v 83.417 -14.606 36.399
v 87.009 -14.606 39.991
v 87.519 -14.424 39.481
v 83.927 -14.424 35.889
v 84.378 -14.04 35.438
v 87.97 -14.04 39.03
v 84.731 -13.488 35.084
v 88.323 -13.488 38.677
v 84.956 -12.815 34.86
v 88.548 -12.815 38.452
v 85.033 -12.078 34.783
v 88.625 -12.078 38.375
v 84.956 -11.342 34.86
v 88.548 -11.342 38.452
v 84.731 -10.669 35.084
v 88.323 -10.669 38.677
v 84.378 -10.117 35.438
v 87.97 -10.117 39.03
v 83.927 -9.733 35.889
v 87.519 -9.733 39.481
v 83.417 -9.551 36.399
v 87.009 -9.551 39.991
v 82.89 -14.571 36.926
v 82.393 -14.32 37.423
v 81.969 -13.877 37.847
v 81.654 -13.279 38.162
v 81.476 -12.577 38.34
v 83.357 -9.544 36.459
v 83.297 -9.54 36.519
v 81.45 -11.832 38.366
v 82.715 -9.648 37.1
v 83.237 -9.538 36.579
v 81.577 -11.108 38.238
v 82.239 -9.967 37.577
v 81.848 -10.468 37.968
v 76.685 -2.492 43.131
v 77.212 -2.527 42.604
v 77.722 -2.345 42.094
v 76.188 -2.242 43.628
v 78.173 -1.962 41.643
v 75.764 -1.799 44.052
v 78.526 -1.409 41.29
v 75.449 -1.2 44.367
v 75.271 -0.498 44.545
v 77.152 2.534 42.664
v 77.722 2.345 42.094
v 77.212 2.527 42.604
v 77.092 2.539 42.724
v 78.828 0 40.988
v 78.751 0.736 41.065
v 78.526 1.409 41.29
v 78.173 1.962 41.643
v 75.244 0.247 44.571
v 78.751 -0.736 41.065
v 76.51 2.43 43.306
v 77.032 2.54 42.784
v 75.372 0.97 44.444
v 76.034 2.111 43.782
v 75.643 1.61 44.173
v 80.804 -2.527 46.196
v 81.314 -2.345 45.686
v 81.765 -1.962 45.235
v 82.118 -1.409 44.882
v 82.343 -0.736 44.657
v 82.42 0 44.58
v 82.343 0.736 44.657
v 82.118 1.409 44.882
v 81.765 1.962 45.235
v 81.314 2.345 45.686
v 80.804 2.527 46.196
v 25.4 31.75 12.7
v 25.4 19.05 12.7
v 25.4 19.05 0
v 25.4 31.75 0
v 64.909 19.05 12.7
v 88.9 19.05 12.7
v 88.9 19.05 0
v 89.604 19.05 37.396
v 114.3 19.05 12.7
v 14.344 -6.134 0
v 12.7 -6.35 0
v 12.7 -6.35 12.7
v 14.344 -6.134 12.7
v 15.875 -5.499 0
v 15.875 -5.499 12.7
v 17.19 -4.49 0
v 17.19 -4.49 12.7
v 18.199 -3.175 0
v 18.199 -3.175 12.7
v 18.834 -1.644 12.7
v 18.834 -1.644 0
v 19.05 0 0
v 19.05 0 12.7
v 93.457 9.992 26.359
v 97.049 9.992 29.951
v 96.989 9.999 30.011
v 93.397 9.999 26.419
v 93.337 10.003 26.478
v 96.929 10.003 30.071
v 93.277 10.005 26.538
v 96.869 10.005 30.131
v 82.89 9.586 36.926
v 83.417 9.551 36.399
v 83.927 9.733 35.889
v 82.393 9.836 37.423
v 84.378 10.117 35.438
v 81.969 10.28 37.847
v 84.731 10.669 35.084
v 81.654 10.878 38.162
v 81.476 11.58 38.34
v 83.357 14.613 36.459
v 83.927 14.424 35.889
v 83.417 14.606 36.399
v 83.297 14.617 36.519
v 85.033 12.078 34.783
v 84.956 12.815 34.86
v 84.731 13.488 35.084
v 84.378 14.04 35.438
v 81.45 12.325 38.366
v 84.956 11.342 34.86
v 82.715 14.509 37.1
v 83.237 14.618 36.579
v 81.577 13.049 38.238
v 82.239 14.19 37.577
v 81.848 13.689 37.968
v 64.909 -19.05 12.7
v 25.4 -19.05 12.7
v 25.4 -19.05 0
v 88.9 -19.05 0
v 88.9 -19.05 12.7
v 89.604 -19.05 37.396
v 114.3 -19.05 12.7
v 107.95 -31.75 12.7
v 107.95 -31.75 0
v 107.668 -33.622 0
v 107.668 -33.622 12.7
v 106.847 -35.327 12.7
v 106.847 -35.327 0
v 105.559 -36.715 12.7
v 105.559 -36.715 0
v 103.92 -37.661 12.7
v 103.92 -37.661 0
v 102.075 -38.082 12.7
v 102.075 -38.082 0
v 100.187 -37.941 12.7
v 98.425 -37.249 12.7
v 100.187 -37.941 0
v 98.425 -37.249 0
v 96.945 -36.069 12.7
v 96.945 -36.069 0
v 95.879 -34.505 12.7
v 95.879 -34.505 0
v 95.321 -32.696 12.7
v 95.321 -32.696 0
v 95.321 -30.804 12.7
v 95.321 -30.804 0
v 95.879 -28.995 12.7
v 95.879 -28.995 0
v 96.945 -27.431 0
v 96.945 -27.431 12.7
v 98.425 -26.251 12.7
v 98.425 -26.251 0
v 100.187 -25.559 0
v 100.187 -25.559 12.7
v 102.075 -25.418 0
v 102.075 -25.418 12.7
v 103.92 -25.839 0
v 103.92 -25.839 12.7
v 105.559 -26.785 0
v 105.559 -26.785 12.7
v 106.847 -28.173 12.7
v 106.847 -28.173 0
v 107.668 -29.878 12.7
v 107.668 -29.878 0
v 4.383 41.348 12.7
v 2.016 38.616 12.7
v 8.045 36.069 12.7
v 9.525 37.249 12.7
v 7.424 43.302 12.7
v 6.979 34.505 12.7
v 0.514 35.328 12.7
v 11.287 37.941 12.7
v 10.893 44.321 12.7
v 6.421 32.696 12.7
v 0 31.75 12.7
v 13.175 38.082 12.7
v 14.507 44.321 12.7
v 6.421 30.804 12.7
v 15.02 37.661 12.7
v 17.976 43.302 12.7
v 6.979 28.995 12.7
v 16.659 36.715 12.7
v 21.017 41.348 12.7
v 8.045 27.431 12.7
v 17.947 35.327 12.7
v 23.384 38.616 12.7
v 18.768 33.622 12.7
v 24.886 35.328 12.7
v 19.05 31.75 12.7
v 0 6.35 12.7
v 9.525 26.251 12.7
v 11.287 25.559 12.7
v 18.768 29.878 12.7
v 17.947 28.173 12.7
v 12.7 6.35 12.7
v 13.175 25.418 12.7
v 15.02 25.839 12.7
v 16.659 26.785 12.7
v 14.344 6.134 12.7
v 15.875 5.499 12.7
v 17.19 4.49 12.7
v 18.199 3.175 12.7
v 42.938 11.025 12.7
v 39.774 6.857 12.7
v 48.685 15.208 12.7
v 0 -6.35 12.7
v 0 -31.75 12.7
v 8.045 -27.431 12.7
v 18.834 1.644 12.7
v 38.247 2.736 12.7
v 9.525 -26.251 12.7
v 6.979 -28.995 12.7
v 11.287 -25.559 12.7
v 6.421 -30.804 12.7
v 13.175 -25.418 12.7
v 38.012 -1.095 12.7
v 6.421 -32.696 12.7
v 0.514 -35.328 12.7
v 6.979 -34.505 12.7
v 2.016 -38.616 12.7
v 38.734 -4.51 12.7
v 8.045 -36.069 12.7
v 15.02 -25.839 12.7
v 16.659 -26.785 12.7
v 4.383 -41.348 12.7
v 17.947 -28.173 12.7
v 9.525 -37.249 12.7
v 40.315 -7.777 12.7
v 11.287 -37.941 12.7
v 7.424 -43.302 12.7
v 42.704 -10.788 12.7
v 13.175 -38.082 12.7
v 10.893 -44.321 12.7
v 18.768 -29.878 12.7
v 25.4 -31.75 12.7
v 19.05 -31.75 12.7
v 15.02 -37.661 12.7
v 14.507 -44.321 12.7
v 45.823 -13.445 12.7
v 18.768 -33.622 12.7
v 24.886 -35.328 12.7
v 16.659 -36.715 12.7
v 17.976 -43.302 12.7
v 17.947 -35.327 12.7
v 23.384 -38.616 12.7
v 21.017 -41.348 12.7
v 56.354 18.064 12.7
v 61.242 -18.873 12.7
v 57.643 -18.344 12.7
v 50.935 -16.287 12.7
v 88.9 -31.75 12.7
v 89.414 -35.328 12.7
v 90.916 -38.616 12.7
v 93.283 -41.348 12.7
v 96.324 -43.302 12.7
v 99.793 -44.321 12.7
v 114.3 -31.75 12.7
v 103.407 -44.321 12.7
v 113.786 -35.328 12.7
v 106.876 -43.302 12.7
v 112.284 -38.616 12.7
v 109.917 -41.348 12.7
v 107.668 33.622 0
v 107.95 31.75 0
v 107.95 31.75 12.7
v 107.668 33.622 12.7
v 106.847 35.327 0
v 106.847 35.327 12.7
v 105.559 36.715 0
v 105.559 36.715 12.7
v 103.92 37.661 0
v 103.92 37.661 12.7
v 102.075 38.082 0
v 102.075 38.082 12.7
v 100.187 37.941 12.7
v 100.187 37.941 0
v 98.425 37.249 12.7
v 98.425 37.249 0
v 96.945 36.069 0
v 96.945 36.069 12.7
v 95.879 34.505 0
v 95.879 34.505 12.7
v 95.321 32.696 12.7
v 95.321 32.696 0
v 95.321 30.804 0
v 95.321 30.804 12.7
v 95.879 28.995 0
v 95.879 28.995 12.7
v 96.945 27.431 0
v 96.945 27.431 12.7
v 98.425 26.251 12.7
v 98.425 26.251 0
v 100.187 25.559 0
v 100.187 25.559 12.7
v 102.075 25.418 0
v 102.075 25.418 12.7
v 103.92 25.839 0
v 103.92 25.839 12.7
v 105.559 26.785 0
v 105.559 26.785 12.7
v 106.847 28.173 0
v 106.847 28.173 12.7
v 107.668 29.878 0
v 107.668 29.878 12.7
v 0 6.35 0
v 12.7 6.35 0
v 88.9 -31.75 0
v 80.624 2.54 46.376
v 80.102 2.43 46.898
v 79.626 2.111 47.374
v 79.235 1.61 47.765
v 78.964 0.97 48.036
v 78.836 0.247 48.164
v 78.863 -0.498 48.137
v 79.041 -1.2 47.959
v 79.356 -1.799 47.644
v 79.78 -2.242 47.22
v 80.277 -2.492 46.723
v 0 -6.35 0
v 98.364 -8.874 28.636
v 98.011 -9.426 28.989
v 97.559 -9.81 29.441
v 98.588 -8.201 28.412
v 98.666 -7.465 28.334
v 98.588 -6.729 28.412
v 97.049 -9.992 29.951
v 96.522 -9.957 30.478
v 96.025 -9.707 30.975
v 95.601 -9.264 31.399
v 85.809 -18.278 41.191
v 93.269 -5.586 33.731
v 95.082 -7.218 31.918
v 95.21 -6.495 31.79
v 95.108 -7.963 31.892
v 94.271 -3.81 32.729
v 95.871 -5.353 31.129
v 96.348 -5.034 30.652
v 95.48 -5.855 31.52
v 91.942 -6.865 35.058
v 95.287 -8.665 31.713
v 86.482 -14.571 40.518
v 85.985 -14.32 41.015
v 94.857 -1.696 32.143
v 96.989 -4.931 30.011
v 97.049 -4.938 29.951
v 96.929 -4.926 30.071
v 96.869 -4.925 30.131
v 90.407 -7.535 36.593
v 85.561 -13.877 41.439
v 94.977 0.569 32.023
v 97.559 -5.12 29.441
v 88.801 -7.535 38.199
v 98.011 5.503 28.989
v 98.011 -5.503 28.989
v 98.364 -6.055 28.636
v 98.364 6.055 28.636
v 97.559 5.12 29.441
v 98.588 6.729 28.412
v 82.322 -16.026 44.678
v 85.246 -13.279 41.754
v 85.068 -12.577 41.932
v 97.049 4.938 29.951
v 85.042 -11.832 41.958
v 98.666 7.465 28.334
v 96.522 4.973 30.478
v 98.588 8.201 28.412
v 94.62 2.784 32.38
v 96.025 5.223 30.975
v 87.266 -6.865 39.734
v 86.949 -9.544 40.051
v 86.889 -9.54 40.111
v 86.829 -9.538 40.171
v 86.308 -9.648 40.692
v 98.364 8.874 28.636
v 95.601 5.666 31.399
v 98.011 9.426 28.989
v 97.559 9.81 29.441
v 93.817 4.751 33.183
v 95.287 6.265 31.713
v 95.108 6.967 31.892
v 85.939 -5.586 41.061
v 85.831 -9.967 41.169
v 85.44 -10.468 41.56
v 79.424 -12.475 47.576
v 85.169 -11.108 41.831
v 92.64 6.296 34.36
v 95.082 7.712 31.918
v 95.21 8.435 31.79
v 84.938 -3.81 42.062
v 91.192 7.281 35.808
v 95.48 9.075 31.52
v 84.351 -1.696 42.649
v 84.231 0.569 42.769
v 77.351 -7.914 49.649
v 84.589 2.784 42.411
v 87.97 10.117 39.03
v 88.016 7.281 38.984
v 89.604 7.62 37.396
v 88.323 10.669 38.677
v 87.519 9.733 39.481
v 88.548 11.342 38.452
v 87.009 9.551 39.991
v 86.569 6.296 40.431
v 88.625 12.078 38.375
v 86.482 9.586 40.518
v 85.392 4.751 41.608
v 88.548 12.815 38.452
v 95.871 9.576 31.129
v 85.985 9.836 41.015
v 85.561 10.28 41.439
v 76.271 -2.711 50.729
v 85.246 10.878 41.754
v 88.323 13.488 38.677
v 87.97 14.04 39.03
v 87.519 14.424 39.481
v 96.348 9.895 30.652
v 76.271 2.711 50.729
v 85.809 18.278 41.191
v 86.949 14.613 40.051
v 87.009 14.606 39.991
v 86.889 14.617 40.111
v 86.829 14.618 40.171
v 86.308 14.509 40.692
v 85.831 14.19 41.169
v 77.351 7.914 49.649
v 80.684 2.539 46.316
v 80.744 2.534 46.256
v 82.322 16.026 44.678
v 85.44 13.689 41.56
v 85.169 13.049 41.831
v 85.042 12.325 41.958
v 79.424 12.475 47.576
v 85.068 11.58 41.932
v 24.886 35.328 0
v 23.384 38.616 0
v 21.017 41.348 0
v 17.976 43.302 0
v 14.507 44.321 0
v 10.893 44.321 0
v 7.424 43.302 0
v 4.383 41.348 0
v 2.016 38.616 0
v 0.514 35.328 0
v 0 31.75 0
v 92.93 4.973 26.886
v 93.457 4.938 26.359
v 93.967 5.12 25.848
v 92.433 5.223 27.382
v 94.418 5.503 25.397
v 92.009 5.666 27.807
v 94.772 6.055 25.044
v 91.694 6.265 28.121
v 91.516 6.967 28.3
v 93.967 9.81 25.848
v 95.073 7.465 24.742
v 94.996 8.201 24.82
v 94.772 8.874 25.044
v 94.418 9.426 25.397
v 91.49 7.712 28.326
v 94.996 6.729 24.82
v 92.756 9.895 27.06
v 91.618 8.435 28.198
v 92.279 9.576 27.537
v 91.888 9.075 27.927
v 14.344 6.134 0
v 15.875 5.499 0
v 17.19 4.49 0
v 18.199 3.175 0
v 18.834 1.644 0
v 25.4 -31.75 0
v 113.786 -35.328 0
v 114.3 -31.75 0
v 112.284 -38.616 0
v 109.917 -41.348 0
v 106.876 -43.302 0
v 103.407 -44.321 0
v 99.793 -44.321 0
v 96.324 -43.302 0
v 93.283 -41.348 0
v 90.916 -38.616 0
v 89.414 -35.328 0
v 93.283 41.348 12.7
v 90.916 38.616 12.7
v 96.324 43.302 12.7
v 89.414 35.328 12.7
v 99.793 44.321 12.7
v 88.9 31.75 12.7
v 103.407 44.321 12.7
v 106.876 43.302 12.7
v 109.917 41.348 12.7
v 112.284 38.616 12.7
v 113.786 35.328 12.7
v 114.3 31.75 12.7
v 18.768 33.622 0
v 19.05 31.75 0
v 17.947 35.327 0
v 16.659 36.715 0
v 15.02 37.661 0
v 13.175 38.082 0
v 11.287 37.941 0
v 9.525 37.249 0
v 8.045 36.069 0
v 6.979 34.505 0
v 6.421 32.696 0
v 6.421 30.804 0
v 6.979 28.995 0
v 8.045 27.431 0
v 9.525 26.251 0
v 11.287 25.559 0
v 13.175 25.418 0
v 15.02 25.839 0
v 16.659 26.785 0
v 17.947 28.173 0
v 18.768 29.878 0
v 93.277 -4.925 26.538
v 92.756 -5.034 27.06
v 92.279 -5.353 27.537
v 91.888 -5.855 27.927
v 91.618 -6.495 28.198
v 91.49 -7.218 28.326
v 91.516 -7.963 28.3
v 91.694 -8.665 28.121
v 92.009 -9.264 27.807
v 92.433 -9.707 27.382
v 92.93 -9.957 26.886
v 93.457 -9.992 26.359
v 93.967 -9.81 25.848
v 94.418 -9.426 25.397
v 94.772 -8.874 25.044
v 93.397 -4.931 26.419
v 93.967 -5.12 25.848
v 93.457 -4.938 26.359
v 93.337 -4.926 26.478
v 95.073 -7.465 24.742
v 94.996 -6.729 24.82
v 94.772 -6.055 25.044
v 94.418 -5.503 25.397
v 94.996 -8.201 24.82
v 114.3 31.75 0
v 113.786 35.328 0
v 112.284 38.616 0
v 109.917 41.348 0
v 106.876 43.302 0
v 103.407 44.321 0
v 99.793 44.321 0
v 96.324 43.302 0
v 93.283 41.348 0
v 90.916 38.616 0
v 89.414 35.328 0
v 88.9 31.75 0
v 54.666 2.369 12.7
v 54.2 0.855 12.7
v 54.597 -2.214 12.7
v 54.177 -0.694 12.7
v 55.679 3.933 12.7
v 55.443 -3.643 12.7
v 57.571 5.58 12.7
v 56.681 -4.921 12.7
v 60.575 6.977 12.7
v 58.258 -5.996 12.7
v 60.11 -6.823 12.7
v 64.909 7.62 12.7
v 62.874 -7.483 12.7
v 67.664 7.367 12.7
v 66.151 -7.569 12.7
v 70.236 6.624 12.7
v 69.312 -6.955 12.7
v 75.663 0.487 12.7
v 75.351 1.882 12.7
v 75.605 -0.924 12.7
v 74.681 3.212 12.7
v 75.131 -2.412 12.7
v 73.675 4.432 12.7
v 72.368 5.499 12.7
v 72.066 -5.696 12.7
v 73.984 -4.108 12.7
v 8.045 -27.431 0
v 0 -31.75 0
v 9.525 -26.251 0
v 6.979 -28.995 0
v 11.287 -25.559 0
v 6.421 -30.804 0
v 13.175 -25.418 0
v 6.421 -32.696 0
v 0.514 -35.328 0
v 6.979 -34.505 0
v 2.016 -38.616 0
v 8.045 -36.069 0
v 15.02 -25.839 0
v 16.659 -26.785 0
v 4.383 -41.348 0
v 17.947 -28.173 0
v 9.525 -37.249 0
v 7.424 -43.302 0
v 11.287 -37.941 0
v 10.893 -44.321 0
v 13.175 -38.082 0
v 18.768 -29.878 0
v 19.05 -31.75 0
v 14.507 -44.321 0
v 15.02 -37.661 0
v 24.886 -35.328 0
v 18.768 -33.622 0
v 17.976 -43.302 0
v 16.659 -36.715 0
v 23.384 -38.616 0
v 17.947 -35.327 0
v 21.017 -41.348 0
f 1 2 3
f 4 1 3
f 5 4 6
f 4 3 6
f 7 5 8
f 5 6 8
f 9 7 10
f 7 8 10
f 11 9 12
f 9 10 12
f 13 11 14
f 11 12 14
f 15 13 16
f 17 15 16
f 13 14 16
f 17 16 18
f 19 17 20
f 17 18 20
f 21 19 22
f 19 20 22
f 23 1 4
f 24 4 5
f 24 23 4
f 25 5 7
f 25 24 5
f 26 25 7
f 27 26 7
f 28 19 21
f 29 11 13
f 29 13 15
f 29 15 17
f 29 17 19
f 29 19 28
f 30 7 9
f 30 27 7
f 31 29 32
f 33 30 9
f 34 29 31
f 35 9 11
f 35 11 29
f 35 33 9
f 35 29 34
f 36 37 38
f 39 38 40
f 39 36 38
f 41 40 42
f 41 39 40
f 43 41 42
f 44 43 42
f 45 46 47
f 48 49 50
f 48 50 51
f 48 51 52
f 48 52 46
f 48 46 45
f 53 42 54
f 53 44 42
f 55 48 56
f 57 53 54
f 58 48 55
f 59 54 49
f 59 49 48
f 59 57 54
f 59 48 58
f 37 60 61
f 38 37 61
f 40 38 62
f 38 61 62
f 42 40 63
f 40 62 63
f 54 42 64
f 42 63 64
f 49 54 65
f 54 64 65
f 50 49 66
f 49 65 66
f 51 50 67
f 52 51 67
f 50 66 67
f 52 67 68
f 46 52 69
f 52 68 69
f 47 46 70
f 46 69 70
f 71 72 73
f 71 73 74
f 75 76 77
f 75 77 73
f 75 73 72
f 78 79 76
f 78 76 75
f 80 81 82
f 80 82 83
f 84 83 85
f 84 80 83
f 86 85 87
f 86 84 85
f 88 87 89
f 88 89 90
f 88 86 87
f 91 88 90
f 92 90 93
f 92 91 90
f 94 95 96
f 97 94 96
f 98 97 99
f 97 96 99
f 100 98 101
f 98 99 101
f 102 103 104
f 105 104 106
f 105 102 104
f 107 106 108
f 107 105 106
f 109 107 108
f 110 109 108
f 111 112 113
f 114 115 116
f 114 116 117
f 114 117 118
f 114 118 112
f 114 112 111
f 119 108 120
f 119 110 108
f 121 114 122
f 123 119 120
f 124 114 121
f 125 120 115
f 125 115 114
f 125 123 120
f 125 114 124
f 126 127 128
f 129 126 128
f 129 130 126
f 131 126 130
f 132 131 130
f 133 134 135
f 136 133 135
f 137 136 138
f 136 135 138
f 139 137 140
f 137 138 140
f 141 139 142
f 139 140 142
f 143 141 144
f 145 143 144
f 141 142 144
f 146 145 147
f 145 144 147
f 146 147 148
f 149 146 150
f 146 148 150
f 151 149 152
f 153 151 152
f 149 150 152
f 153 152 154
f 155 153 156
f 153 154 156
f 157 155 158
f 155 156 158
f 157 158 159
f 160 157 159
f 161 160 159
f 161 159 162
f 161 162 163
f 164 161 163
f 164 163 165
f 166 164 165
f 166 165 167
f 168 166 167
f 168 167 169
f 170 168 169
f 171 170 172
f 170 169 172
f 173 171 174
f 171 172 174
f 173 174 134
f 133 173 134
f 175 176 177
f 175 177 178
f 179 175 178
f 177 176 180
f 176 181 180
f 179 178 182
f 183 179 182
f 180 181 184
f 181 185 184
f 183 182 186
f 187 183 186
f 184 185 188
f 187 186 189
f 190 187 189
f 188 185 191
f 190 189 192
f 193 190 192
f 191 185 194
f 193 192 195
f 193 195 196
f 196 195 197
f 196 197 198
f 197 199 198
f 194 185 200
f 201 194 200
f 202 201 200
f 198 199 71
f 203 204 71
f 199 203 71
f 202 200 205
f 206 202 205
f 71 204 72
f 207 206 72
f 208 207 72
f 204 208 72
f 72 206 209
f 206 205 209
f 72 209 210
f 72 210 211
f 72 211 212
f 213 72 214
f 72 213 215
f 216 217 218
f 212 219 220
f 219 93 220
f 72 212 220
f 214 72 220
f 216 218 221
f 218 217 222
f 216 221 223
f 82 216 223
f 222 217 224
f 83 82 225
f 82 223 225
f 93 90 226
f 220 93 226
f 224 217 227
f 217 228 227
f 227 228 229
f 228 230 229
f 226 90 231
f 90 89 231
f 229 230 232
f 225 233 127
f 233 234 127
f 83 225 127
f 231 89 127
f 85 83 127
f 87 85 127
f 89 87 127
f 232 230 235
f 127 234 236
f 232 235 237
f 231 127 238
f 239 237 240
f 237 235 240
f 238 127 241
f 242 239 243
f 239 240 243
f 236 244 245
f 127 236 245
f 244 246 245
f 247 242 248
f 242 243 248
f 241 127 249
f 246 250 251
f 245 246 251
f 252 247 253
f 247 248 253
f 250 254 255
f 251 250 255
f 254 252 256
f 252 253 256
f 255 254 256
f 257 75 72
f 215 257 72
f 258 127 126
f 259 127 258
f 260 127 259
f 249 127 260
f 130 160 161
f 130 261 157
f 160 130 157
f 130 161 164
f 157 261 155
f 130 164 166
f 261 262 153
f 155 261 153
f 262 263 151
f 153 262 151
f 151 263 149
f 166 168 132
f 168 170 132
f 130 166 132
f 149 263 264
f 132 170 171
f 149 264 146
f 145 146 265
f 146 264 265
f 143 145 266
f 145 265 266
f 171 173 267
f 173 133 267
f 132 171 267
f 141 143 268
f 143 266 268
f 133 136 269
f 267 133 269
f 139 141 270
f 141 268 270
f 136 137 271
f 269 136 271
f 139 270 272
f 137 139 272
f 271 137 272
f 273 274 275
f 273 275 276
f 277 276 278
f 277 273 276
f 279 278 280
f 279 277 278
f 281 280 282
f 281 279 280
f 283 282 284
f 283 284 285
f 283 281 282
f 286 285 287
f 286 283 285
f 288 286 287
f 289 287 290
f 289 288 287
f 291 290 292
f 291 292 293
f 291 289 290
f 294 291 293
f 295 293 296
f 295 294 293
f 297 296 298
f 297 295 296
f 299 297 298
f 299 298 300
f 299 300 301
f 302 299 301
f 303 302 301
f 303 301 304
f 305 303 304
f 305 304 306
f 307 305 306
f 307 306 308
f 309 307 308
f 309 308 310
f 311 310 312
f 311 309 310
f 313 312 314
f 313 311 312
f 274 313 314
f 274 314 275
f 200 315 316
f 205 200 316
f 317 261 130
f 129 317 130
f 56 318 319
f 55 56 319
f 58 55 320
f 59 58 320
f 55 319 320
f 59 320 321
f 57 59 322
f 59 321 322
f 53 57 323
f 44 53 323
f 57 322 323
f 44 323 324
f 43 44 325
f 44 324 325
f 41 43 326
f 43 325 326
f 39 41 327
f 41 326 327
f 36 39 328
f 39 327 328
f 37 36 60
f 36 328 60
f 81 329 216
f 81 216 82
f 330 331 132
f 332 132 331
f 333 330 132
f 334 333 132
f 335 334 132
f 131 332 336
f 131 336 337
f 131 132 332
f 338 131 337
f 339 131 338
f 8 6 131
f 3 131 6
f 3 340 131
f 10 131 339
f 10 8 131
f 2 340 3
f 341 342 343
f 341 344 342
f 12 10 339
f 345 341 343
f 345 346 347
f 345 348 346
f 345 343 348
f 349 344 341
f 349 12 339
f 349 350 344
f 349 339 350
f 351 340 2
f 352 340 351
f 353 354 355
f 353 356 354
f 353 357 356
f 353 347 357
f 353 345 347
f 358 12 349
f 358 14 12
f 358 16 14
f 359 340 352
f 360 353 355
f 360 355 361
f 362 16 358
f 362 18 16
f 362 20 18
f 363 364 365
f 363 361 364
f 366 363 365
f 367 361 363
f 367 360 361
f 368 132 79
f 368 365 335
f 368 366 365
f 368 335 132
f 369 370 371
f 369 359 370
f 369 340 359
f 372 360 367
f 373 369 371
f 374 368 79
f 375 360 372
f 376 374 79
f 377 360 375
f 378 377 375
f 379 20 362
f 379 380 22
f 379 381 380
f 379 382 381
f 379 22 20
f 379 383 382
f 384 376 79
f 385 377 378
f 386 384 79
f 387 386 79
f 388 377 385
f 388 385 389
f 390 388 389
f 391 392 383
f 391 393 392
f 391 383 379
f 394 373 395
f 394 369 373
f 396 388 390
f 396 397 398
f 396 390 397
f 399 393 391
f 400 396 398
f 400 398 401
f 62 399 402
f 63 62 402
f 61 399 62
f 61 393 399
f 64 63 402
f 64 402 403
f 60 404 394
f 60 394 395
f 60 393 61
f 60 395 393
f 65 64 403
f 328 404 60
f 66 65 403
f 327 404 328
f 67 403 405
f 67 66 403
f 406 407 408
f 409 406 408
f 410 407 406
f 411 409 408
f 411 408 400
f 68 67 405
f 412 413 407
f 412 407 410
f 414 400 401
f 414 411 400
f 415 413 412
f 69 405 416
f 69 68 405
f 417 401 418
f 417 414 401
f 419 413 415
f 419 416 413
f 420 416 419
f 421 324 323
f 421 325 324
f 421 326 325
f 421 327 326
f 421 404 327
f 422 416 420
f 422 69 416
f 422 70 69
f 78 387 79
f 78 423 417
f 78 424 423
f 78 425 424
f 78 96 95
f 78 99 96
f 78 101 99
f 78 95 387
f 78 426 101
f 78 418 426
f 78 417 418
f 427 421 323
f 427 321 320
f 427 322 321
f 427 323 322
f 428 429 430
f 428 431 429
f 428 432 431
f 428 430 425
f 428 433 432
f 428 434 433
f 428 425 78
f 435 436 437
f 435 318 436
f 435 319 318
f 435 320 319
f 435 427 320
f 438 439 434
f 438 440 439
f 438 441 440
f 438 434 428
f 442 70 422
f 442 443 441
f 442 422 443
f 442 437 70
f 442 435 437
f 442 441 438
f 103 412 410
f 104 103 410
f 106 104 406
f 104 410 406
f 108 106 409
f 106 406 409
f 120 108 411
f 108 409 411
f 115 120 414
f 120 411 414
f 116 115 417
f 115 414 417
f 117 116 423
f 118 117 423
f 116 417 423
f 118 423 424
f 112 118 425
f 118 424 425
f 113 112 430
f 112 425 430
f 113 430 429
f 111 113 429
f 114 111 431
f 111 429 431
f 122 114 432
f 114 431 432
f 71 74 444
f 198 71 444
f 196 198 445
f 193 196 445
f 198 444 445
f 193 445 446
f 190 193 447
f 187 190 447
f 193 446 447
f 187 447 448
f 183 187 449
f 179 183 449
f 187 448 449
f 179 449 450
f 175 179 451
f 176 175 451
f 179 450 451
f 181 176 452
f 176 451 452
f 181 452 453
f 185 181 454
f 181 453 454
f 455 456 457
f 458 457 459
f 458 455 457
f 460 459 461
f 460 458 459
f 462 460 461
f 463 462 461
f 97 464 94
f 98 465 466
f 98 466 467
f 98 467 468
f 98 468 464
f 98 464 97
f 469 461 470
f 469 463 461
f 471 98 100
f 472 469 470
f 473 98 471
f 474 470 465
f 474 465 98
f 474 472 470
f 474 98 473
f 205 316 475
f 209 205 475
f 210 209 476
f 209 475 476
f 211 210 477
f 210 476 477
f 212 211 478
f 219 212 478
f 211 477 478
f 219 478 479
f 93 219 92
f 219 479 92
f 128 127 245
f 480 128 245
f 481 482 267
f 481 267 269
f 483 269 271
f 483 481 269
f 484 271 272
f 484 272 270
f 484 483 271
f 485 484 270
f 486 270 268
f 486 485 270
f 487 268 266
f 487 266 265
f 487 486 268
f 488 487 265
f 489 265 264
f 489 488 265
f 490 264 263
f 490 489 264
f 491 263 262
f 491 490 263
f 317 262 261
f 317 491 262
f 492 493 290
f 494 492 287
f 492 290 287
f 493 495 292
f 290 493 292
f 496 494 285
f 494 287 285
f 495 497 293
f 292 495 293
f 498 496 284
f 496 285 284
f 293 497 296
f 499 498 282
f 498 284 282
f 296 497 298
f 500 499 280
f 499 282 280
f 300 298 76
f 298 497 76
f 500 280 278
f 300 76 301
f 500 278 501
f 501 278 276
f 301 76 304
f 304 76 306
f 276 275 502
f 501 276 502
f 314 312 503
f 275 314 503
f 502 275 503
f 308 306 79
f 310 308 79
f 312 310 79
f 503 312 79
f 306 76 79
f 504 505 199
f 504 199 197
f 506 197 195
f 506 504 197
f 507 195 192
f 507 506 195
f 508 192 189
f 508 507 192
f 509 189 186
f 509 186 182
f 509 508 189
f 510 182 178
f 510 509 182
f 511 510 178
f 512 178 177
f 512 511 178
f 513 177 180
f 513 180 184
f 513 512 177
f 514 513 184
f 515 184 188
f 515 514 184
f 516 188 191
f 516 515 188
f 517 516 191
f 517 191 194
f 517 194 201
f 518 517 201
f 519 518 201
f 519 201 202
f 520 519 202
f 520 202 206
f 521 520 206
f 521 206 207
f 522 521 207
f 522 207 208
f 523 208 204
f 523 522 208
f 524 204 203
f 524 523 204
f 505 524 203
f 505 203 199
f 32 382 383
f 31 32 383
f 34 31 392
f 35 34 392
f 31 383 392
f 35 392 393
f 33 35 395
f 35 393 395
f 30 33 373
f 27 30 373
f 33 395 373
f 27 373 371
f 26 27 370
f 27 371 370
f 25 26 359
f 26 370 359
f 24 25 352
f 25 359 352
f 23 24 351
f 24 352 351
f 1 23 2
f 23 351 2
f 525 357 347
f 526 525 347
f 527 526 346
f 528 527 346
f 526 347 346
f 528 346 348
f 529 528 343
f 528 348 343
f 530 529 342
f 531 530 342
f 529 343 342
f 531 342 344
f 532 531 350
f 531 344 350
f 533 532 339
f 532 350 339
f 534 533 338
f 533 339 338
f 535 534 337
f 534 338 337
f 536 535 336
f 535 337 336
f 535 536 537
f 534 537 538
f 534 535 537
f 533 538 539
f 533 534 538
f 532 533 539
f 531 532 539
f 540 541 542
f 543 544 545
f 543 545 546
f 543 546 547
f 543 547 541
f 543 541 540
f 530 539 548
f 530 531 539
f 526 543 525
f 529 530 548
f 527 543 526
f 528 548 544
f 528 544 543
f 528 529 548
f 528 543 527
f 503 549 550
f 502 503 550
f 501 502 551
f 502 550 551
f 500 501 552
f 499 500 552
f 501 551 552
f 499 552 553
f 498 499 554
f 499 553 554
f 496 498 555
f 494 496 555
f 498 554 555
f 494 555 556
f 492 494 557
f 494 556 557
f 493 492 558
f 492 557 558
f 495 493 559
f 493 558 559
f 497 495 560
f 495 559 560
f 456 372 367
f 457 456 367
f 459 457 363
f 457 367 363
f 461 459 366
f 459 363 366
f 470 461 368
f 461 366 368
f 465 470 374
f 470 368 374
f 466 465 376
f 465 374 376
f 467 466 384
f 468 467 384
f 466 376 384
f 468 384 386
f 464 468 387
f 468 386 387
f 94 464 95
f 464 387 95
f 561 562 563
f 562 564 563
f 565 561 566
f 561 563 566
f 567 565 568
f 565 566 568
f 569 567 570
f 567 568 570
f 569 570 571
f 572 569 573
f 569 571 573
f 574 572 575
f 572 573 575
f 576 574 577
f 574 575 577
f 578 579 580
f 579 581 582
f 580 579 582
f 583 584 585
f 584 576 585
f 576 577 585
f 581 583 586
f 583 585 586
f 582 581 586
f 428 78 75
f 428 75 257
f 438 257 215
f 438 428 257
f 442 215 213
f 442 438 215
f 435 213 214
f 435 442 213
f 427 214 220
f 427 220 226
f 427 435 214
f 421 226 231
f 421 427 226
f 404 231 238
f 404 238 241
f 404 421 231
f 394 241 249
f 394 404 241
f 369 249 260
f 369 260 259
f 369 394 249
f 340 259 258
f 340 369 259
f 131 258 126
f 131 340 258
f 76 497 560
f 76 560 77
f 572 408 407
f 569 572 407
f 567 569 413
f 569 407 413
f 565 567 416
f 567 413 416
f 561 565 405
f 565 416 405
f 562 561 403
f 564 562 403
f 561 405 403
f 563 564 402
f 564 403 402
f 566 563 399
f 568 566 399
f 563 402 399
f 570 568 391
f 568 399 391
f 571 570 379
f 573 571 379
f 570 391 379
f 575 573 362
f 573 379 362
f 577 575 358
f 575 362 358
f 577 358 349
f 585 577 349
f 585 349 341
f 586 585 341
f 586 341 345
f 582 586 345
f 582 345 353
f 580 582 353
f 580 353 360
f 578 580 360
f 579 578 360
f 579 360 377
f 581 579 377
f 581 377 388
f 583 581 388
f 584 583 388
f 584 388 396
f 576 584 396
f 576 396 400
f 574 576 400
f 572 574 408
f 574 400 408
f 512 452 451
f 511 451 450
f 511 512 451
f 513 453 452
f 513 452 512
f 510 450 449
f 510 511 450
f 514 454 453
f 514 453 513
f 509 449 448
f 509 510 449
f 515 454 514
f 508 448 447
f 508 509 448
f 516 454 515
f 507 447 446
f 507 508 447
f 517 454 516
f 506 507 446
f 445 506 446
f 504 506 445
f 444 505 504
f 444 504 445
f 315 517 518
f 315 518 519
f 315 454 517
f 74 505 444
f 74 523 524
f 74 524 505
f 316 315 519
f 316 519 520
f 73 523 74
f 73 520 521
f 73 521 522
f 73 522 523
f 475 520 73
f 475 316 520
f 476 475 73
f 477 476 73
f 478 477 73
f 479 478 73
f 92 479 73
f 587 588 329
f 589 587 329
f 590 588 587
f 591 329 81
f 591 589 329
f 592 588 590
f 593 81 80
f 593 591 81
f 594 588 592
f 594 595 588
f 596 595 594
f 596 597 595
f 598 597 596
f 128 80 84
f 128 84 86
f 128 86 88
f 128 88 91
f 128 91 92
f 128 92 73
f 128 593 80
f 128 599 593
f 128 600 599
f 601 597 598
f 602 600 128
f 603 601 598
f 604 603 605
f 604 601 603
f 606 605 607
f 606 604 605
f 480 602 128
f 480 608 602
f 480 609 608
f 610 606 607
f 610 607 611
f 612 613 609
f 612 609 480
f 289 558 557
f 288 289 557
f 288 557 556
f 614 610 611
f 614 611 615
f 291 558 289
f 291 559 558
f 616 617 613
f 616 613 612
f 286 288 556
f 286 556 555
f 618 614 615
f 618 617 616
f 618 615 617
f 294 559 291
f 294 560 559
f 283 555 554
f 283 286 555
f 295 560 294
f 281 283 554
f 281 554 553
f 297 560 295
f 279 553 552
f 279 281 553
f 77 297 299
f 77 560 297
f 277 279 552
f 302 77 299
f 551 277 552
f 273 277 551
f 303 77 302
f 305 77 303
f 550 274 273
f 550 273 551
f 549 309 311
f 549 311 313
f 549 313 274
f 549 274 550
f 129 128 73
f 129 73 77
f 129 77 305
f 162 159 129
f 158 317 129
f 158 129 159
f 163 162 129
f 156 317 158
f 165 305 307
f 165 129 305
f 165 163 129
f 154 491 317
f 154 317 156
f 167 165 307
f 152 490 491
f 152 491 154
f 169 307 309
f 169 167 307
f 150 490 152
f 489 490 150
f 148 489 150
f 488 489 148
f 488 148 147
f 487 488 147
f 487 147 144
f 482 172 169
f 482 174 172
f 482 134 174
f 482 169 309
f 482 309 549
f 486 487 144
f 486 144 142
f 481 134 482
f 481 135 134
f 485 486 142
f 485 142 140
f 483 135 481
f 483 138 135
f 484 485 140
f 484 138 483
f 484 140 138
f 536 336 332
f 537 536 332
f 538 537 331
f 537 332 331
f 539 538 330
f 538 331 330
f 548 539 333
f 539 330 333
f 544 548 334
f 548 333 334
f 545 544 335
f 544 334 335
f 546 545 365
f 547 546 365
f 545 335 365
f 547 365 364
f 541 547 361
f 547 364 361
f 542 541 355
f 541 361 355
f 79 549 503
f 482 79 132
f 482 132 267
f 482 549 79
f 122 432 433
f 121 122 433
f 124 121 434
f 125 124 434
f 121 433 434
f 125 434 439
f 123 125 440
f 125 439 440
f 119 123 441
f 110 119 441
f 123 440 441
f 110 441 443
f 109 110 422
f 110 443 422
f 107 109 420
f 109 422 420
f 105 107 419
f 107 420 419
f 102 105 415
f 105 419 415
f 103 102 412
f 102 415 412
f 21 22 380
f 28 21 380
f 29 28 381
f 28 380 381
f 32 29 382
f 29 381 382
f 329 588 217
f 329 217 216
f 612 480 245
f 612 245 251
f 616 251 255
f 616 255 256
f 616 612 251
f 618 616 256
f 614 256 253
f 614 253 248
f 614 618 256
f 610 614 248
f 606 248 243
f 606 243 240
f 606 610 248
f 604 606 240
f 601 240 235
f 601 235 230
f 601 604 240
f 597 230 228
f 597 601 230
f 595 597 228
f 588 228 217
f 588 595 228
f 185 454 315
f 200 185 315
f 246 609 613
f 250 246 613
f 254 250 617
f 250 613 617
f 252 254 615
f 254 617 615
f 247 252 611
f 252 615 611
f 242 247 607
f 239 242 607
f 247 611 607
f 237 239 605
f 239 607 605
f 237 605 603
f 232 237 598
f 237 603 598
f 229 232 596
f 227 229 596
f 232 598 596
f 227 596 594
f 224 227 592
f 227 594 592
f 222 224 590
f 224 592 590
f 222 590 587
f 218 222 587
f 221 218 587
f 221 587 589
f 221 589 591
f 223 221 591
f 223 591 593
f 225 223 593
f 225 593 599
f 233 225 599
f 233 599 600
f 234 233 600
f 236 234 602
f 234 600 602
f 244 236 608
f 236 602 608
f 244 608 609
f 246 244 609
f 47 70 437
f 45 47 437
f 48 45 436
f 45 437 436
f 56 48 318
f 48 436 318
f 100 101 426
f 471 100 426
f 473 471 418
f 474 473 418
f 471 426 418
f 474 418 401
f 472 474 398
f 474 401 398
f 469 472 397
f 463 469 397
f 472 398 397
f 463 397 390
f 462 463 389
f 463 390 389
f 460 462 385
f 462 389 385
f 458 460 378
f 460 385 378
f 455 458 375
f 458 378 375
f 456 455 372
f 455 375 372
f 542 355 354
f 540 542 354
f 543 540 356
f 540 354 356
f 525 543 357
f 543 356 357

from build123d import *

# Parameters (mm, degrees)
F0_R             = 6.35
F1_DEPTH         = 12.7
F4_R             = 7.62
F6_DEPTH         = 5.08
F6_COPIES_COUNT  = 2
F6_COPIES_PITCH  = 14.929745
F6_COPIES1_COUNT = 2
F6_COPIES1_PITCH = 14.929745
F6_COPIES2_COUNT = 2
F6_COPIES2_PITCH = 24.156836
F6_COPIES3_COUNT = 2
F6_COPIES3_PITCH = 24.156836


# Not quite as in the source:
# - a pattern or mirror of a feature is missing from the dataset's text; its kind, count and spacing are read off the source's solid


with BuildPart() as f1:
    # F0 (on Top) → F1 (new body)
    with BuildSketch(Plane.XY):
        with BuildLine():
            Line((0, 31.75), (0, 6.35))
            Line((0, 6.35), (12.7, 6.35))
            ThreePointArc((12.7, 6.35), (17.1901280605, 4.4901280605), (19.05, 0))
            Line((19.05, 0), (114.3, 0))
            Line((114.3, 0), (114.3, 31.75))
            ThreePointArc((114.3, 31.75), (101.6, 44.45), (88.9, 31.75))
            Line((88.9, 31.75), (88.9, 19.05))
            Line((88.9, 19.05), (25.4, 19.05))
            Line((25.4, 19.05), (25.4, 31.75))
            ThreePointArc((25.4, 31.75), (12.7, 44.45), (0, 31.75))
        make_face()
        with Locations((12.7, 31.75)):
            Circle(F0_R, mode=Mode.SUBTRACT)
        with Locations((101.6, 31.75)):
            Circle(F0_R, mode=Mode.SUBTRACT)
    extrude(amount=F1_DEPTH)

    # F2: F1 across plane


with BuildPart() as f1_1:
    add(f1.part)
    add(f1.part.mirror(Plane.XZ))

    # F4 (on face) → F5 (join, up to the next surface of F1)
    with BuildSketch(Plane(origin=(63.5, 0, 63.5), x_dir=(0, 1, 0), z_dir=(0.7071067812, 0, 0.7071067812))):
        with BuildLine():
            Line((-19.05, -36.9170489686), (-19.05, -71.8420489686))
            Line((-19.05, -71.8420489686), (19.05, -71.8420489686))
            Line((19.05, -71.8420489686), (19.05, -36.9170489686))
            ThreePointArc((19.05, -36.9170489686), (0, -17.8670489686), (-19.05, -36.9170489686))
        make_face()
        with BuildLine():
            ThreePointArc((-2.5272680903, -24.4710489686), (-0.1271594487, -21.6802339429), (2.54, -24.2170489686))
            ThreePointArc((2.54, -24.2170489686), (2.5368150257, -24.3442084172), (2.5272680903, -24.4710489686))
            ThreePointArc((2.5272680903, -24.4710489686), (9.8332676346, -28.8798325582), (12.7, -36.9170489686))
            ThreePointArc((12.7, -36.9170489686), (-8.0372164104, -46.7503166031), (-2.5272680903, -24.4710489686))
        make_face(mode=Mode.SUBTRACT)
        with BuildLine():
            ThreePointArc((2.5272680903, -24.4710489686), (0, -26.7570489686), (-2.5272680903, -24.4710489686))
            ThreePointArc((-2.5272680903, -24.4710489686), (-8.0372164104, -46.7503166031), (12.7, -36.9170489686))
            ThreePointArc((12.7, -36.9170489686), (9.8332676346, -28.8798325582), (2.5272680903, -24.4710489686))
        make_face()
        with Locations((0, -36.9170489686)):
            Circle(F4_R, mode=Mode.SUBTRACT)
        with BuildLine():
            ThreePointArc((2.5272680903, -24.4710489686), (2.5368150257, -24.3442084172), (2.54, -24.2170489686))
            ThreePointArc((2.54, -24.2170489686), (-0.1271594487, -21.6802339429), (-2.5272680903, -24.4710489686))
            ThreePointArc((-2.5272680903, -24.4710489686), (0, -24.2170489686), (2.5272680903, -24.4710489686))
        make_face()
        with BuildLine():
            ThreePointArc((2.5272680903, -24.4710489686), (0, -24.2170489686), (-2.5272680903, -24.4710489686))
            ThreePointArc((-2.5272680903, -24.4710489686), (0, -26.7570489686), (2.5272680903, -24.4710489686))
        make_face()
    extrude(until=Until.NEXT, dir=(-0.7071067812, 0, -0.7071067812))

    # F4 (on face) → F6 (cut)
    with BuildSketch(Plane(origin=(63.5, 0, 63.5), x_dir=(0, 1, 0), z_dir=(0.7071067812, 0, 0.7071067812))):
        with BuildLine():
            ThreePointArc((2.5272680903, -24.4710489686), (2.5368150257, -24.3442084172), (2.54, -24.2170489686))
            ThreePointArc((2.54, -24.2170489686), (-0.1271594487, -21.6802339429), (-2.5272680903, -24.4710489686))
            ThreePointArc((-2.5272680903, -24.4710489686), (0, -24.2170489686), (2.5272680903, -24.4710489686))
        make_face()
        with BuildLine():
            ThreePointArc((2.5272680903, -24.4710489686), (0, -24.2170489686), (-2.5272680903, -24.4710489686))
            ThreePointArc((-2.5272680903, -24.4710489686), (0, -26.7570489686), (2.5272680903, -24.4710489686))
        make_face()
    f6 = extrude(amount=-F6_DEPTH, mode=Mode.SUBTRACT)

    # F6_copies: F6 ×2
    with Locations(*[Vector(0.4156269378, 0.8090169944, -0.4156269378) * (i * F6_COPIES_PITCH) for i in range(1, F6_COPIES_COUNT)]):
        add(f6, mode=Mode.SUBTRACT)

    # F6_copies1: F6 ×2
    with Locations(*[Vector(0.4156269378, -0.8090169944, -0.4156269378) * (i * F6_COPIES1_PITCH) for i in range(1, F6_COPIES1_COUNT)]):
        add(f6, mode=Mode.SUBTRACT)

    # F6_copies2: F6 ×2
    with Locations(*[Vector(0.672498512, -0.3090169944, -0.672498512) * (i * F6_COPIES2_PITCH) for i in range(1, F6_COPIES2_COUNT)]):
        add(f6, mode=Mode.SUBTRACT)

    # F6_copies3: F6 ×2
    with Locations(*[Vector(0.672498512, 0.3090169944, -0.672498512) * (i * F6_COPIES3_PITCH) for i in range(1, F6_COPIES3_COUNT)]):
        add(f6, mode=Mode.SUBTRACT)


solid = f1_1.part
